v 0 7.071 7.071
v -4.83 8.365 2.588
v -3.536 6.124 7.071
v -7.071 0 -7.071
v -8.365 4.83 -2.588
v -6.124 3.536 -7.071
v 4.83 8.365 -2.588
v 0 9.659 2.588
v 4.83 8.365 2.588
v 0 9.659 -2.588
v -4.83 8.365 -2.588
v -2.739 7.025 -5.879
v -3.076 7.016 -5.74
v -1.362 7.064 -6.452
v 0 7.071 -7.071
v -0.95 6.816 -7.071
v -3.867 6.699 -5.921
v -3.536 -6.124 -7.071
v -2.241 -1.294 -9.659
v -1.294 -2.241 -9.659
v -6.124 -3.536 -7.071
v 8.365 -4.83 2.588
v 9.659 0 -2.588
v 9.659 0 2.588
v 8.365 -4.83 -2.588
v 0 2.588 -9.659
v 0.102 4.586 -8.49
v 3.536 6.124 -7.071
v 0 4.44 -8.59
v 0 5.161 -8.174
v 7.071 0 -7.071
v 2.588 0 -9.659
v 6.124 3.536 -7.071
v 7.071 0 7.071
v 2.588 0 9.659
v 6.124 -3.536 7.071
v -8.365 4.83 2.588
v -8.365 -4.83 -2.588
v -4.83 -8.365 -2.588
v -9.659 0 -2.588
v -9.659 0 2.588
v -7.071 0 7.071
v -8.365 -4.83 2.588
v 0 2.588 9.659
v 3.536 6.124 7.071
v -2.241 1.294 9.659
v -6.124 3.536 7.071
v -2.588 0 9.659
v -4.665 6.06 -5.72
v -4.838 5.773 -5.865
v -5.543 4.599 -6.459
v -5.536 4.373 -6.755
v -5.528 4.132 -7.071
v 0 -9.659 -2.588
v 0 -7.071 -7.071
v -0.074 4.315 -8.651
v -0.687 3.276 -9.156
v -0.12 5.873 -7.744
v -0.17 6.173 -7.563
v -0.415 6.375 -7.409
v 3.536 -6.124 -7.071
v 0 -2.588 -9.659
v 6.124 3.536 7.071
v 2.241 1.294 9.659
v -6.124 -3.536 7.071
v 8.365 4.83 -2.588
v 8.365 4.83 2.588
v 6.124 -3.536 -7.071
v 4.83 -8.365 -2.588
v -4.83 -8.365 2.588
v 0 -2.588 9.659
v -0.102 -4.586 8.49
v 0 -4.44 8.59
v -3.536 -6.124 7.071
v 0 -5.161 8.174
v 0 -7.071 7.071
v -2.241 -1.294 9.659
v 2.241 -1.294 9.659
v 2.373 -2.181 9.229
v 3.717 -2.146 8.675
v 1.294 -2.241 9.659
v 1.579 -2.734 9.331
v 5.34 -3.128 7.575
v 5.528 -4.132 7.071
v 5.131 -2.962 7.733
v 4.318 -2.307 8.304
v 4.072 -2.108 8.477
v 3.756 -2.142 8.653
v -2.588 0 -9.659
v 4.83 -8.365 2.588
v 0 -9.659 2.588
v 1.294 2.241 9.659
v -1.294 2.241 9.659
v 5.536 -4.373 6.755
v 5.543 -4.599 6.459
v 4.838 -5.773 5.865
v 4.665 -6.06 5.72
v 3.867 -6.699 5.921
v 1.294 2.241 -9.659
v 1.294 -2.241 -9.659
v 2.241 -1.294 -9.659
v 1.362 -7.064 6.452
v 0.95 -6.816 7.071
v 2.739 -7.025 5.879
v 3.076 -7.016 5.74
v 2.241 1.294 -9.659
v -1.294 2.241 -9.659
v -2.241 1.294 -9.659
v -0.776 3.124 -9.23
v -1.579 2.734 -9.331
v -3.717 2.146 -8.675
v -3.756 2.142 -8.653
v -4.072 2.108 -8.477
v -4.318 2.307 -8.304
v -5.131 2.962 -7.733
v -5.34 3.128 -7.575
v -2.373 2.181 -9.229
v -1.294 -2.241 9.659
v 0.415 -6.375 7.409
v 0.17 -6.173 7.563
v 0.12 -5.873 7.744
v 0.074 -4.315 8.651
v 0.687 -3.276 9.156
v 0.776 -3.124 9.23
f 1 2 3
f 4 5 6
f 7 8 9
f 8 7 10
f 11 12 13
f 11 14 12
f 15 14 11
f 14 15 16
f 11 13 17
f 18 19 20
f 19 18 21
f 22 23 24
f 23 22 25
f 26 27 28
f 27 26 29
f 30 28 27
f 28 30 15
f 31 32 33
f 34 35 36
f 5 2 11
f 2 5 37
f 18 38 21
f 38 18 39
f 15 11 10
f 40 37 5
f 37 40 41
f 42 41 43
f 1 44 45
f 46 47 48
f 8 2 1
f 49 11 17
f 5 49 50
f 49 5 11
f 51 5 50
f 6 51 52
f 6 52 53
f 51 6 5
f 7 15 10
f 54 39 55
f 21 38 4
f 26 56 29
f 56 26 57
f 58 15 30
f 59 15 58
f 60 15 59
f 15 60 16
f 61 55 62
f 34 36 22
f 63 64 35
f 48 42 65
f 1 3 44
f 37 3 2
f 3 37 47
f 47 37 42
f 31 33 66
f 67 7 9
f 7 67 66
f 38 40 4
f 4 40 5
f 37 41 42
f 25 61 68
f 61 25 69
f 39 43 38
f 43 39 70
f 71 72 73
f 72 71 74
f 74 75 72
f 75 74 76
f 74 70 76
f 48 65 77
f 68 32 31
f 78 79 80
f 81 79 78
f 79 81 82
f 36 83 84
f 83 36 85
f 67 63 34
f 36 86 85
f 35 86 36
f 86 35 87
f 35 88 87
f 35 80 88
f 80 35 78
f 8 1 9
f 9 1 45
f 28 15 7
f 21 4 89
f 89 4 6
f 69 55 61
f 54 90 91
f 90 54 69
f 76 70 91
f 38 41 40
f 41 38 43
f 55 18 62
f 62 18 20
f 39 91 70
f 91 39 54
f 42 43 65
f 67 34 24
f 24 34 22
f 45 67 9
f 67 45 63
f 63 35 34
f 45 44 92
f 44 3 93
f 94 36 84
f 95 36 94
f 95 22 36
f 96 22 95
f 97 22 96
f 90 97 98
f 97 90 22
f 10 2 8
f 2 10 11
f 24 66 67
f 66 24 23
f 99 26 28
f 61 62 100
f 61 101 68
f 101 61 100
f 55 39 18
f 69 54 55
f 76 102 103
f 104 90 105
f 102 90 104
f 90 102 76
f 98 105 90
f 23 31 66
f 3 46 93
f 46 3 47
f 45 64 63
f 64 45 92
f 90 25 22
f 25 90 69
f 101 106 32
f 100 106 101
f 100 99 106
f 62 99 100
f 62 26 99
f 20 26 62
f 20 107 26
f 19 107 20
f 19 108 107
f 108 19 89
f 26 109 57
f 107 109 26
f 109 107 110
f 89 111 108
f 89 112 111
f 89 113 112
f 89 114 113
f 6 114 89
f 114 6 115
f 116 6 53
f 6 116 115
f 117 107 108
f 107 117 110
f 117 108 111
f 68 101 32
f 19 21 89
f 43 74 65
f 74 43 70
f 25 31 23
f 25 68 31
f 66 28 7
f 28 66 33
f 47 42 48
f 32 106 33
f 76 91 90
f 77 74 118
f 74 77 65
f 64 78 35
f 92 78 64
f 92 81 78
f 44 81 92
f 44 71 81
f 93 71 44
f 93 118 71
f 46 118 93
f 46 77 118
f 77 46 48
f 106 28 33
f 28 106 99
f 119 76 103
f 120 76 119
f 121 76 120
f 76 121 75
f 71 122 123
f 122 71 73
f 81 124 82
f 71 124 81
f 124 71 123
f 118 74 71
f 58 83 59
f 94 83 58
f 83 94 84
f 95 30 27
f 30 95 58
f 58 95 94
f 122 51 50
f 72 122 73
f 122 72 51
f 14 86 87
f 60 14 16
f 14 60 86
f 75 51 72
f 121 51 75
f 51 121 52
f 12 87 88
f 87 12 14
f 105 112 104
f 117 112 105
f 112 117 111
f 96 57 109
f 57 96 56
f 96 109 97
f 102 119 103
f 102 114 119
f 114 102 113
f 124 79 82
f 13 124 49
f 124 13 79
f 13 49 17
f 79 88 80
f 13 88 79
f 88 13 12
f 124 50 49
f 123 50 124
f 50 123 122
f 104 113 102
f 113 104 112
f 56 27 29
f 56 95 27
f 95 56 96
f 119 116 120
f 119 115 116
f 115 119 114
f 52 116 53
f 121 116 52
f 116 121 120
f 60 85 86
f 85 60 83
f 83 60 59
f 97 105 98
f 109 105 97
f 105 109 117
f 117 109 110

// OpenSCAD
// The exact-geometry audit's case x07 (docs/audits/exact-geometry-rust.md).
difference() { hull() sphere(10, $fn=12); rotate([30,20,0]) cylinder(r=3, h=30, center=true); }
